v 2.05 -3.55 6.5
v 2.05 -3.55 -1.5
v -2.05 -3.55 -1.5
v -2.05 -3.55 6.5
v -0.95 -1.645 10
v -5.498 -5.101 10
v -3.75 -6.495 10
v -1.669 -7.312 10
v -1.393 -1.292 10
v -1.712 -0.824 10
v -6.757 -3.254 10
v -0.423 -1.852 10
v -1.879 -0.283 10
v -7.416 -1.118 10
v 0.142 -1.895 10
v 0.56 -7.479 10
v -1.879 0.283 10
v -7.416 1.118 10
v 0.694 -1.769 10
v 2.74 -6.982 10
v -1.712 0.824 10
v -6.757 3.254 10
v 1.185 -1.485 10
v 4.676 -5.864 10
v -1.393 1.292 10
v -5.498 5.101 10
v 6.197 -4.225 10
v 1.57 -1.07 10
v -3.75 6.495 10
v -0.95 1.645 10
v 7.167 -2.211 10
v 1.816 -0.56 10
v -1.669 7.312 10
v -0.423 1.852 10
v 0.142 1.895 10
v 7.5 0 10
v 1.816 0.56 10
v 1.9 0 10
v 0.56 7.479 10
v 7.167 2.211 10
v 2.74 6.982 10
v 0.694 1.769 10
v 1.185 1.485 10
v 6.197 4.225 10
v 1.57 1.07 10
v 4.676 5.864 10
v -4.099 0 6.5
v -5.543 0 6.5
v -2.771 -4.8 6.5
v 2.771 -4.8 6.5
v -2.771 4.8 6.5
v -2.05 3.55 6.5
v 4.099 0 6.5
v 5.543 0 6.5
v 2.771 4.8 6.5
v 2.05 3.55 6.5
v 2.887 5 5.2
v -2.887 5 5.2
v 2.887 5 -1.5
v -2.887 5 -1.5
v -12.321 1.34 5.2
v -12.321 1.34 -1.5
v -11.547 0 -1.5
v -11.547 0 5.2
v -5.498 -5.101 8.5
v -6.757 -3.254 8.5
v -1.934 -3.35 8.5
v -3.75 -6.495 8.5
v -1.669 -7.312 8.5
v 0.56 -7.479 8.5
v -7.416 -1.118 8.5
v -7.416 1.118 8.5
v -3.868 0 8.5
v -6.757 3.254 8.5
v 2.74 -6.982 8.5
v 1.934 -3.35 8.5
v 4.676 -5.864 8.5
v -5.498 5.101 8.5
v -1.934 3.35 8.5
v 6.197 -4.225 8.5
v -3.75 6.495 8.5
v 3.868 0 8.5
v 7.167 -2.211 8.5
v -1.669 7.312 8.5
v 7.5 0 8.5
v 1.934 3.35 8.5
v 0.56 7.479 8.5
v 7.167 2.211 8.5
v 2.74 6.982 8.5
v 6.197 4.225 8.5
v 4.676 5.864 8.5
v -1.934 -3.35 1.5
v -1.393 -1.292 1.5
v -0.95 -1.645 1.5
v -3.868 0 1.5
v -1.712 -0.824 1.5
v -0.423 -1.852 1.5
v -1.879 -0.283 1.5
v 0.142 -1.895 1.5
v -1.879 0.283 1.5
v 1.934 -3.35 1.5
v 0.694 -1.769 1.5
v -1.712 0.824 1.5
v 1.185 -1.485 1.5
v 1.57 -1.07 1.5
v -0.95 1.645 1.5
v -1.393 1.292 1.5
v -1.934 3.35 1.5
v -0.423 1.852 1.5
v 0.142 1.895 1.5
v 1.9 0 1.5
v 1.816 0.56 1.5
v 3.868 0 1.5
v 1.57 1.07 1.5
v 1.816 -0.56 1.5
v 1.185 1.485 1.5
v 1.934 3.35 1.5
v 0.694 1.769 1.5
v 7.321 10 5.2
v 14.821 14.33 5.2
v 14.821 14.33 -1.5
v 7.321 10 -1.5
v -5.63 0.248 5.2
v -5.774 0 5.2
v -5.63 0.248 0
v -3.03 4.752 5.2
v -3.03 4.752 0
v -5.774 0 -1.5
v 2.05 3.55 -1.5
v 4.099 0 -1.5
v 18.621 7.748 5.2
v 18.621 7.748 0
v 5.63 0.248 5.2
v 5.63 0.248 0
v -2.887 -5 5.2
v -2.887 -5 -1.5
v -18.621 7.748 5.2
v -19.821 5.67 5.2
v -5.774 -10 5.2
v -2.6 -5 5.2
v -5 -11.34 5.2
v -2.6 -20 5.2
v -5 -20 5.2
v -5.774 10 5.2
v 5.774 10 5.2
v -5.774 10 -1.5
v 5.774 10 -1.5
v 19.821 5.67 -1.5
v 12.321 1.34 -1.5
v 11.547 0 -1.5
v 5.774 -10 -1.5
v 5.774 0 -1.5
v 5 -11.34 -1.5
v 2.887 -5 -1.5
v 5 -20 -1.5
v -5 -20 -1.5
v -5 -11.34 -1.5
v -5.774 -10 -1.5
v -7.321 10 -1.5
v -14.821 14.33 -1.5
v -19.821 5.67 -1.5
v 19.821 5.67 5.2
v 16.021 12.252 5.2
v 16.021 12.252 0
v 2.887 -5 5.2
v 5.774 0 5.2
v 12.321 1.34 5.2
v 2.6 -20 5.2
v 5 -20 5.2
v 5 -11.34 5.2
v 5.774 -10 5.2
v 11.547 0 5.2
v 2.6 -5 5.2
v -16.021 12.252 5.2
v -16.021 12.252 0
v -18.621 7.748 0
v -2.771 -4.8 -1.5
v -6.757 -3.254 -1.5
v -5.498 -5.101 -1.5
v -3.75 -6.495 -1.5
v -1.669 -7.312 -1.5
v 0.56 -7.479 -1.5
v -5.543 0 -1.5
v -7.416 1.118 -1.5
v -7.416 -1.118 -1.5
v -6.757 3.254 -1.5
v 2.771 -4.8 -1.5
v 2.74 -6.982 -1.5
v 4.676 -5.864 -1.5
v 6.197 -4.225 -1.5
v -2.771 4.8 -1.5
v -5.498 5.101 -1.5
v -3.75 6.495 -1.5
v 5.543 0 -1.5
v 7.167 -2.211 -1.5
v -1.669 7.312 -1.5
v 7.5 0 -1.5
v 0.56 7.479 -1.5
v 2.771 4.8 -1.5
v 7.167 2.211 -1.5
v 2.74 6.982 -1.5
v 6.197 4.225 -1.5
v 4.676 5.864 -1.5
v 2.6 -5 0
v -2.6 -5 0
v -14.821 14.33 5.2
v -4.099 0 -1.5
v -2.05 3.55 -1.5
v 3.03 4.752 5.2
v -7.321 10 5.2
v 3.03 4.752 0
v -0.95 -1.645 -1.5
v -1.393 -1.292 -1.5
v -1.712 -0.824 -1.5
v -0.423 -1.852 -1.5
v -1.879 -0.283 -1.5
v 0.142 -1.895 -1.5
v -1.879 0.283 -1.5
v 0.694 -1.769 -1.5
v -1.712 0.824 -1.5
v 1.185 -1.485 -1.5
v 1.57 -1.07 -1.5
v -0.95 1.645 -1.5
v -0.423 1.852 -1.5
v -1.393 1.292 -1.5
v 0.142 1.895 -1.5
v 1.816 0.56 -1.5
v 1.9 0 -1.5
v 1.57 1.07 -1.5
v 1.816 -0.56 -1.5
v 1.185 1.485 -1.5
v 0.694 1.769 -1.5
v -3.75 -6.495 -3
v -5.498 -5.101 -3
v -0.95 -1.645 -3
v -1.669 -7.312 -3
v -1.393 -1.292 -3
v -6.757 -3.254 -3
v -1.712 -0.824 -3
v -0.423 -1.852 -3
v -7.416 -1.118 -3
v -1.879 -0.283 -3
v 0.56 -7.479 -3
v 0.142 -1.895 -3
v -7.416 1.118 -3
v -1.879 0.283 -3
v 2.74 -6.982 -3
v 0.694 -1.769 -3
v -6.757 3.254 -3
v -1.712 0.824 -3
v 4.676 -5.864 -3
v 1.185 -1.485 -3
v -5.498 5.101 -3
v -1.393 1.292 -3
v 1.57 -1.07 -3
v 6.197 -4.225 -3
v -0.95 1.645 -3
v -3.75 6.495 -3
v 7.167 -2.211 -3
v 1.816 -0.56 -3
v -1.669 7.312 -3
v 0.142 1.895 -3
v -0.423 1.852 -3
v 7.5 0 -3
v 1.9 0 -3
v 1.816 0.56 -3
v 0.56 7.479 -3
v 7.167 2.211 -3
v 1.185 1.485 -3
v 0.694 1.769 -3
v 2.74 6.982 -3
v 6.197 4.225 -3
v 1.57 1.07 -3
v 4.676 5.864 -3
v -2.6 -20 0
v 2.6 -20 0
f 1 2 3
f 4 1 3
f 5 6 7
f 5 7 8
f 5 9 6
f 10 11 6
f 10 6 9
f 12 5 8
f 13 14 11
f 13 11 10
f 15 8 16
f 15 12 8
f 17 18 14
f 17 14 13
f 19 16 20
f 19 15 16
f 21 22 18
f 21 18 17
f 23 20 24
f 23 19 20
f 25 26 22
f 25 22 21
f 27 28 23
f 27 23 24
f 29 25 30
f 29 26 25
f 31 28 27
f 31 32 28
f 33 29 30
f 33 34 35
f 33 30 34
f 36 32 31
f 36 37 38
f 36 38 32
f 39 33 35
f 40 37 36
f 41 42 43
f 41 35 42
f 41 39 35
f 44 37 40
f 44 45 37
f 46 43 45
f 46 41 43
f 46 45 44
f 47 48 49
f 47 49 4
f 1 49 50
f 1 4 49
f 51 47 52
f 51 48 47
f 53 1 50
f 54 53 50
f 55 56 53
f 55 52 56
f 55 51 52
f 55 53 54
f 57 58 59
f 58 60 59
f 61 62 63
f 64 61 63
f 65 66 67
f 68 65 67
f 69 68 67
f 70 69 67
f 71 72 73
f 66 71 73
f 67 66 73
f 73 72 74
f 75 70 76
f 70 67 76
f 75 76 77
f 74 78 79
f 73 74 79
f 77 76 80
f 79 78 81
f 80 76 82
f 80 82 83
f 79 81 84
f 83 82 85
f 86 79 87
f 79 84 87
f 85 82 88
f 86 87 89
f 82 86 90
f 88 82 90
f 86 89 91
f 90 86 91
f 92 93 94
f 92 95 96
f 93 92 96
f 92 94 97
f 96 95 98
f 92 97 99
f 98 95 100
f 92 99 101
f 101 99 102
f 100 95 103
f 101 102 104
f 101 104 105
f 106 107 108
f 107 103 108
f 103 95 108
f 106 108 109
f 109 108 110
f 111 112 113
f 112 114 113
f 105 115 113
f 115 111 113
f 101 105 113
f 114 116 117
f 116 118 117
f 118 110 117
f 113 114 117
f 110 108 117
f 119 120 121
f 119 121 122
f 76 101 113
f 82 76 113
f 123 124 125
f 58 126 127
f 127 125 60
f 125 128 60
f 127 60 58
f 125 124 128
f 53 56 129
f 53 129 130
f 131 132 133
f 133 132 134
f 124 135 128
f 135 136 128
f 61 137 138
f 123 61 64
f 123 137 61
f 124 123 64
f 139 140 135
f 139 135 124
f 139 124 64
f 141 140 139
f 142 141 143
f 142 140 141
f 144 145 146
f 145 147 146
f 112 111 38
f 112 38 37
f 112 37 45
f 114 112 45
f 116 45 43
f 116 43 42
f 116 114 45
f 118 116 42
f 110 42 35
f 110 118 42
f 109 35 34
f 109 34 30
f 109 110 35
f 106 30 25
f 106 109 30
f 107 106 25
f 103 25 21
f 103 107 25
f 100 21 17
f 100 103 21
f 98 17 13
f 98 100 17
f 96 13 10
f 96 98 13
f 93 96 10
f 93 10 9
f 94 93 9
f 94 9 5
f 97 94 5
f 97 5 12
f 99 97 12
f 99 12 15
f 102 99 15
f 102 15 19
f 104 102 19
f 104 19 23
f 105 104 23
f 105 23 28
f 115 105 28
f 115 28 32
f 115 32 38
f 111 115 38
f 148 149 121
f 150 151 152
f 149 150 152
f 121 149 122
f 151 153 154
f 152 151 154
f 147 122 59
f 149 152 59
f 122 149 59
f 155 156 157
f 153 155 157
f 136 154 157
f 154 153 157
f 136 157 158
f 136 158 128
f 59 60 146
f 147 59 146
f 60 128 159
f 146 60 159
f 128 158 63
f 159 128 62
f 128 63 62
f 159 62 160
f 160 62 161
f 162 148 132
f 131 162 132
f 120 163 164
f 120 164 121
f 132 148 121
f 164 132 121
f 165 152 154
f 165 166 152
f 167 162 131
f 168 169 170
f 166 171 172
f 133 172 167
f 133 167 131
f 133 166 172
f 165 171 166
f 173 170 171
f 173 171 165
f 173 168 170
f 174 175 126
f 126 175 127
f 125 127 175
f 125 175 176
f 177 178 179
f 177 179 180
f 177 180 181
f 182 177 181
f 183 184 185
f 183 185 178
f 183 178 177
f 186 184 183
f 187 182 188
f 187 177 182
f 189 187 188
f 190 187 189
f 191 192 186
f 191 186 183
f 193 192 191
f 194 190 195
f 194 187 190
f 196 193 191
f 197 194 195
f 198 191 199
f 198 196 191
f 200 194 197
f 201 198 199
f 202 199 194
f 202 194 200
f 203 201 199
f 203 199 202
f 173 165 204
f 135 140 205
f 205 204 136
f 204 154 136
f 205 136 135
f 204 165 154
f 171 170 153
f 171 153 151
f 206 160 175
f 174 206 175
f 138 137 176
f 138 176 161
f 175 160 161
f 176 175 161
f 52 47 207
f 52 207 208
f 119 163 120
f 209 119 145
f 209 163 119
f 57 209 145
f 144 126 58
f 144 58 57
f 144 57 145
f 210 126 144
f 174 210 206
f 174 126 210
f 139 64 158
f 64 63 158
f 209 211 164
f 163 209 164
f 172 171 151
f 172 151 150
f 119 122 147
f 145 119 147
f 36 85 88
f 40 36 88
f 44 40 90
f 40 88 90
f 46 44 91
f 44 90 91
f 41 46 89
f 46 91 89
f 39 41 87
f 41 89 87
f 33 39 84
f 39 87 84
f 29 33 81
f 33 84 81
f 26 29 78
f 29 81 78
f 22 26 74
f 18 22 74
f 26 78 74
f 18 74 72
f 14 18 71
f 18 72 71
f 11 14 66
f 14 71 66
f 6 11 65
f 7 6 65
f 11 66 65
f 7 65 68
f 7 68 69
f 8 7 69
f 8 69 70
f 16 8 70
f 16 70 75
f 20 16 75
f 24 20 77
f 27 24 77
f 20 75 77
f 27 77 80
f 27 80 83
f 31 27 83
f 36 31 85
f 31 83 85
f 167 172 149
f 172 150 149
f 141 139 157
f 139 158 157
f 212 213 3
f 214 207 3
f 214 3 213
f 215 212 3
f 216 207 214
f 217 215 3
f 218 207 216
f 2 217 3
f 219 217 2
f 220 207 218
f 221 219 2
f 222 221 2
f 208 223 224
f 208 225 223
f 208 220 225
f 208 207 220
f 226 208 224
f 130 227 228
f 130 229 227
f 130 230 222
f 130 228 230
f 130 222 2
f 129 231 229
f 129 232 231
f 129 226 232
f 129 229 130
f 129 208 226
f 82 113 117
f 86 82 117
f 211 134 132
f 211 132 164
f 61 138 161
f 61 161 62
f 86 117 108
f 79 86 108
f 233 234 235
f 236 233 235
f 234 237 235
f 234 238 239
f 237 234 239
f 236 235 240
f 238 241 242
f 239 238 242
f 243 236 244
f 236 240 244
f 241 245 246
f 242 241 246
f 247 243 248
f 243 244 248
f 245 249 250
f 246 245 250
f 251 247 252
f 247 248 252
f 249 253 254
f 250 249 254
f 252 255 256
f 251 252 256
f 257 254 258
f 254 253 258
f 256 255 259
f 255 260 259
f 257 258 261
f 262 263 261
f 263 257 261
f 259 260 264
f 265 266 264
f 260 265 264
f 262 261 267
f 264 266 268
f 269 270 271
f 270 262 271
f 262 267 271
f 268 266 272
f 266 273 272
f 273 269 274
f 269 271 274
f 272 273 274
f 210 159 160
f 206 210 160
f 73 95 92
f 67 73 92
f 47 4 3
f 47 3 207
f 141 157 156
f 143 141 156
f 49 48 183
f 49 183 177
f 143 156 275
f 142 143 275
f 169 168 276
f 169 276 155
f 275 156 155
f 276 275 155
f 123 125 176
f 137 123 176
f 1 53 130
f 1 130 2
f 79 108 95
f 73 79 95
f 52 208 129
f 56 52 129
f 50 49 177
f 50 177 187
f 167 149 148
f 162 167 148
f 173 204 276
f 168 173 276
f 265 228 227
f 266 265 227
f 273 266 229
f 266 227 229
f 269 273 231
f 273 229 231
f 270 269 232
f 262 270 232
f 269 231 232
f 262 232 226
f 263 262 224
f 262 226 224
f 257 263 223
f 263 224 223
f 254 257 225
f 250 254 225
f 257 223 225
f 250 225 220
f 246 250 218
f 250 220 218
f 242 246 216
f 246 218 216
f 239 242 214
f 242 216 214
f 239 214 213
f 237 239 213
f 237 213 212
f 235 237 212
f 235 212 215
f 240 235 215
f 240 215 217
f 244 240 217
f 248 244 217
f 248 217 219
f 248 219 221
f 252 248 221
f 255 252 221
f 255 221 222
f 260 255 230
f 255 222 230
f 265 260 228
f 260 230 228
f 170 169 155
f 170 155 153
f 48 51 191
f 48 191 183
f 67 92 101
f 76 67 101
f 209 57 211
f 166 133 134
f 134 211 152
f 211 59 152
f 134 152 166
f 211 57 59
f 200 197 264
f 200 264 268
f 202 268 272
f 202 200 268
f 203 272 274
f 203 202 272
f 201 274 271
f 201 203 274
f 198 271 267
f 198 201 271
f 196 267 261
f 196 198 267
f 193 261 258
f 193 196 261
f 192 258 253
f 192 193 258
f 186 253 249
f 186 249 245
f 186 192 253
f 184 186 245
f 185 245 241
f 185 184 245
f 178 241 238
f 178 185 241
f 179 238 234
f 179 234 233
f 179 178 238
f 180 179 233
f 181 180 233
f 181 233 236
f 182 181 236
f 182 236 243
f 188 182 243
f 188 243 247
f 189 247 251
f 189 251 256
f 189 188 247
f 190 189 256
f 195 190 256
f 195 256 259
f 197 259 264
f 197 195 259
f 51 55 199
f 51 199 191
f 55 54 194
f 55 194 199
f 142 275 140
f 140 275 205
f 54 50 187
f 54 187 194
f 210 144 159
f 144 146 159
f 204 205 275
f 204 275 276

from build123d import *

# Parameters (mm, degrees)
F0_W          = 5.2
F0_H          = 10
F0_H_2        = 5
F2_DEPTH      = 1.5
F3_DEPTH      = 5.2
F4_COUNT      = 3
F7_START      = -1.5
F5_R          = 7.5
F5_R_2        = 1.9
F7_DEPTH      = 1.5
F8_DEPTH      = 6.5
F8_DEPTH_BACK = 3
F9_START      = 8.5
F9_DEPTH      = 1.5
F10_START     = 1.5
F10_DEPTH     = 8.5


with BuildPart() as f2:
    # F0 (on Top) → F2 (new body, through all)
    with BuildSketch(Plane.XY):
        with Locations((0, -15)):
            Rectangle(F0_W, F0_H)
        with Locations((0, -7.5)):
            Rectangle(F0_W, F0_H_2)
        Polygon((-2.6, -20), (-2.6, -10), (-2.6, -5), (-2.8867513459, -5), (-5.7735026919, 0), (-11.5470053838, 0), (-5.7735026919, -10), (-5, -11.3397459622), (-5, -20), align=None)
        Polygon((2.6, -5), (2.6, -10), (2.6, -20), (5, -20), (5, -11.3397459622), (5.7735026919, -10), (11.5470053838, 0), (5.7735026919, 0), (2.8867513459, -5), align=None)
    extrude(amount=-F2_DEPTH)

    # F0 (on Top) → F3 (join, through all)
    with BuildSketch(Plane.XY):
        Polygon((-2.6, -20), (-2.6, -10), (-2.6, -5), (-2.8867513459, -5), (-5.7735026919, 0), (-11.5470053838, 0), (-5.7735026919, -10), (-5, -11.3397459622), (-5, -20), align=None)
        Polygon((2.6, -5), (2.6, -10), (2.6, -20), (5, -20), (5, -11.3397459622), (5.7735026919, -10), (11.5470053838, 0), (5.7735026919, 0), (2.8867513459, -5), align=None)
    extrude(amount=F3_DEPTH)

    # F4: F2 ×3 about axis
    f4_axis = Axis((0, 0, 3.5901106894), (0, 0, -1))


with BuildPart() as f2_1:
    add(f2.part)
    for i in range(1, F4_COUNT):
        add(f2.part.rotate(f4_axis, i * 360 / F4_COUNT))


with BuildPart() as f7:
    # F5 (on Top) → F7 (new body)
    with BuildSketch(Plane.XY.offset(F7_START)):
        Circle(F5_R)
        Polygon((5.5425625842, 0), (2.7712812921, -4.8), (-2.7712812921, -4.8), (-5.5425625842, 0), (-2.7712812921, 4.8), (2.7712812921, 4.8), align=None, mode=Mode.SUBTRACT)
        Polygon((-2.7712812921, -4.8), (2.7712812921, -4.8), (5.5425625842, 0), (2.7712812921, 4.8), (-2.7712812921, 4.8), (-5.5425625842, 0), align=None)
        Polygon((4.0991869112, 0), (2.0495934556, -3.55), (-2.0495934556, -3.55), (-4.0991869112, 0), (-2.0495934556, 3.55), (2.0495934556, 3.55), align=None, mode=Mode.SUBTRACT)
        Polygon((-2.0495934556, -3.55), (2.0495934556, -3.55), (4.0991869112, 0), (2.0495934556, 3.55), (-2.0495934556, 3.55), (-4.0991869112, 0), align=None)
        Polygon((3.8682468036, 0), (1.9341234018, -3.35), (-1.9341234018, -3.35), (-3.8682468036, 0), (-1.9341234018, 3.35), (1.9341234018, 3.35), align=None, mode=Mode.SUBTRACT)
        Polygon((-1.9341234018, -3.35), (1.9341234018, -3.35), (3.8682468036, 0), (1.9341234018, 3.35), (-1.9341234018, 3.35), (-3.8682468036, 0), align=None)
        Circle(F5_R_2, mode=Mode.SUBTRACT)
    extrude(amount=-F7_DEPTH)

    # F5 (on Top) → F8 (join, two sides)
    with BuildSketch(Plane.XY) as f8_sk:
        Polygon((-2.7712812921, -4.8), (2.7712812921, -4.8), (5.5425625842, 0), (2.7712812921, 4.8), (-2.7712812921, 4.8), (-5.5425625842, 0), align=None)
        Polygon((4.0991869112, 0), (2.0495934556, -3.55), (-2.0495934556, -3.55), (-4.0991869112, 0), (-2.0495934556, 3.55), (2.0495934556, 3.55), align=None, mode=Mode.SUBTRACT)
    extrude(amount=F8_DEPTH)
    extrude(f8_sk.sketch, amount=-F8_DEPTH_BACK)


with BuildPart() as f9:
    # F5 (on Top) → F9 (new body)
    with BuildSketch(Plane.XY.offset(F9_START)):
        Circle(F5_R)
        Polygon((5.5425625842, 0), (2.7712812921, -4.8), (-2.7712812921, -4.8), (-5.5425625842, 0), (-2.7712812921, 4.8), (2.7712812921, 4.8), align=None, mode=Mode.SUBTRACT)
        Polygon((-2.7712812921, -4.8), (2.7712812921, -4.8), (5.5425625842, 0), (2.7712812921, 4.8), (-2.7712812921, 4.8), (-5.5425625842, 0), align=None)
        Polygon((4.0991869112, 0), (2.0495934556, -3.55), (-2.0495934556, -3.55), (-4.0991869112, 0), (-2.0495934556, 3.55), (2.0495934556, 3.55), align=None, mode=Mode.SUBTRACT)
        Polygon((-2.0495934556, -3.55), (2.0495934556, -3.55), (4.0991869112, 0), (2.0495934556, 3.55), (-2.0495934556, 3.55), (-4.0991869112, 0), align=None)
        Polygon((3.8682468036, 0), (1.9341234018, -3.35), (-1.9341234018, -3.35), (-3.8682468036, 0), (-1.9341234018, 3.35), (1.9341234018, 3.35), align=None, mode=Mode.SUBTRACT)
        Polygon((-1.9341234018, -3.35), (1.9341234018, -3.35), (3.8682468036, 0), (1.9341234018, 3.35), (-1.9341234018, 3.35), (-3.8682468036, 0), align=None)
        Circle(F5_R_2, mode=Mode.SUBTRACT)
    extrude(amount=F9_DEPTH)

    # F5 (on Top) → F10 (join)
    with BuildSketch(Plane.XY.offset(F10_START)):
        Polygon((-1.9341234018, -3.35), (1.9341234018, -3.35), (3.8682468036, 0), (1.9341234018, 3.35), (-1.9341234018, 3.35), (-3.8682468036, 0), align=None)
        Circle(F5_R_2, mode=Mode.SUBTRACT)
    extrude(amount=F10_DEPTH)


solid = Compound([f2_1.part, f7.part, f9.part])
